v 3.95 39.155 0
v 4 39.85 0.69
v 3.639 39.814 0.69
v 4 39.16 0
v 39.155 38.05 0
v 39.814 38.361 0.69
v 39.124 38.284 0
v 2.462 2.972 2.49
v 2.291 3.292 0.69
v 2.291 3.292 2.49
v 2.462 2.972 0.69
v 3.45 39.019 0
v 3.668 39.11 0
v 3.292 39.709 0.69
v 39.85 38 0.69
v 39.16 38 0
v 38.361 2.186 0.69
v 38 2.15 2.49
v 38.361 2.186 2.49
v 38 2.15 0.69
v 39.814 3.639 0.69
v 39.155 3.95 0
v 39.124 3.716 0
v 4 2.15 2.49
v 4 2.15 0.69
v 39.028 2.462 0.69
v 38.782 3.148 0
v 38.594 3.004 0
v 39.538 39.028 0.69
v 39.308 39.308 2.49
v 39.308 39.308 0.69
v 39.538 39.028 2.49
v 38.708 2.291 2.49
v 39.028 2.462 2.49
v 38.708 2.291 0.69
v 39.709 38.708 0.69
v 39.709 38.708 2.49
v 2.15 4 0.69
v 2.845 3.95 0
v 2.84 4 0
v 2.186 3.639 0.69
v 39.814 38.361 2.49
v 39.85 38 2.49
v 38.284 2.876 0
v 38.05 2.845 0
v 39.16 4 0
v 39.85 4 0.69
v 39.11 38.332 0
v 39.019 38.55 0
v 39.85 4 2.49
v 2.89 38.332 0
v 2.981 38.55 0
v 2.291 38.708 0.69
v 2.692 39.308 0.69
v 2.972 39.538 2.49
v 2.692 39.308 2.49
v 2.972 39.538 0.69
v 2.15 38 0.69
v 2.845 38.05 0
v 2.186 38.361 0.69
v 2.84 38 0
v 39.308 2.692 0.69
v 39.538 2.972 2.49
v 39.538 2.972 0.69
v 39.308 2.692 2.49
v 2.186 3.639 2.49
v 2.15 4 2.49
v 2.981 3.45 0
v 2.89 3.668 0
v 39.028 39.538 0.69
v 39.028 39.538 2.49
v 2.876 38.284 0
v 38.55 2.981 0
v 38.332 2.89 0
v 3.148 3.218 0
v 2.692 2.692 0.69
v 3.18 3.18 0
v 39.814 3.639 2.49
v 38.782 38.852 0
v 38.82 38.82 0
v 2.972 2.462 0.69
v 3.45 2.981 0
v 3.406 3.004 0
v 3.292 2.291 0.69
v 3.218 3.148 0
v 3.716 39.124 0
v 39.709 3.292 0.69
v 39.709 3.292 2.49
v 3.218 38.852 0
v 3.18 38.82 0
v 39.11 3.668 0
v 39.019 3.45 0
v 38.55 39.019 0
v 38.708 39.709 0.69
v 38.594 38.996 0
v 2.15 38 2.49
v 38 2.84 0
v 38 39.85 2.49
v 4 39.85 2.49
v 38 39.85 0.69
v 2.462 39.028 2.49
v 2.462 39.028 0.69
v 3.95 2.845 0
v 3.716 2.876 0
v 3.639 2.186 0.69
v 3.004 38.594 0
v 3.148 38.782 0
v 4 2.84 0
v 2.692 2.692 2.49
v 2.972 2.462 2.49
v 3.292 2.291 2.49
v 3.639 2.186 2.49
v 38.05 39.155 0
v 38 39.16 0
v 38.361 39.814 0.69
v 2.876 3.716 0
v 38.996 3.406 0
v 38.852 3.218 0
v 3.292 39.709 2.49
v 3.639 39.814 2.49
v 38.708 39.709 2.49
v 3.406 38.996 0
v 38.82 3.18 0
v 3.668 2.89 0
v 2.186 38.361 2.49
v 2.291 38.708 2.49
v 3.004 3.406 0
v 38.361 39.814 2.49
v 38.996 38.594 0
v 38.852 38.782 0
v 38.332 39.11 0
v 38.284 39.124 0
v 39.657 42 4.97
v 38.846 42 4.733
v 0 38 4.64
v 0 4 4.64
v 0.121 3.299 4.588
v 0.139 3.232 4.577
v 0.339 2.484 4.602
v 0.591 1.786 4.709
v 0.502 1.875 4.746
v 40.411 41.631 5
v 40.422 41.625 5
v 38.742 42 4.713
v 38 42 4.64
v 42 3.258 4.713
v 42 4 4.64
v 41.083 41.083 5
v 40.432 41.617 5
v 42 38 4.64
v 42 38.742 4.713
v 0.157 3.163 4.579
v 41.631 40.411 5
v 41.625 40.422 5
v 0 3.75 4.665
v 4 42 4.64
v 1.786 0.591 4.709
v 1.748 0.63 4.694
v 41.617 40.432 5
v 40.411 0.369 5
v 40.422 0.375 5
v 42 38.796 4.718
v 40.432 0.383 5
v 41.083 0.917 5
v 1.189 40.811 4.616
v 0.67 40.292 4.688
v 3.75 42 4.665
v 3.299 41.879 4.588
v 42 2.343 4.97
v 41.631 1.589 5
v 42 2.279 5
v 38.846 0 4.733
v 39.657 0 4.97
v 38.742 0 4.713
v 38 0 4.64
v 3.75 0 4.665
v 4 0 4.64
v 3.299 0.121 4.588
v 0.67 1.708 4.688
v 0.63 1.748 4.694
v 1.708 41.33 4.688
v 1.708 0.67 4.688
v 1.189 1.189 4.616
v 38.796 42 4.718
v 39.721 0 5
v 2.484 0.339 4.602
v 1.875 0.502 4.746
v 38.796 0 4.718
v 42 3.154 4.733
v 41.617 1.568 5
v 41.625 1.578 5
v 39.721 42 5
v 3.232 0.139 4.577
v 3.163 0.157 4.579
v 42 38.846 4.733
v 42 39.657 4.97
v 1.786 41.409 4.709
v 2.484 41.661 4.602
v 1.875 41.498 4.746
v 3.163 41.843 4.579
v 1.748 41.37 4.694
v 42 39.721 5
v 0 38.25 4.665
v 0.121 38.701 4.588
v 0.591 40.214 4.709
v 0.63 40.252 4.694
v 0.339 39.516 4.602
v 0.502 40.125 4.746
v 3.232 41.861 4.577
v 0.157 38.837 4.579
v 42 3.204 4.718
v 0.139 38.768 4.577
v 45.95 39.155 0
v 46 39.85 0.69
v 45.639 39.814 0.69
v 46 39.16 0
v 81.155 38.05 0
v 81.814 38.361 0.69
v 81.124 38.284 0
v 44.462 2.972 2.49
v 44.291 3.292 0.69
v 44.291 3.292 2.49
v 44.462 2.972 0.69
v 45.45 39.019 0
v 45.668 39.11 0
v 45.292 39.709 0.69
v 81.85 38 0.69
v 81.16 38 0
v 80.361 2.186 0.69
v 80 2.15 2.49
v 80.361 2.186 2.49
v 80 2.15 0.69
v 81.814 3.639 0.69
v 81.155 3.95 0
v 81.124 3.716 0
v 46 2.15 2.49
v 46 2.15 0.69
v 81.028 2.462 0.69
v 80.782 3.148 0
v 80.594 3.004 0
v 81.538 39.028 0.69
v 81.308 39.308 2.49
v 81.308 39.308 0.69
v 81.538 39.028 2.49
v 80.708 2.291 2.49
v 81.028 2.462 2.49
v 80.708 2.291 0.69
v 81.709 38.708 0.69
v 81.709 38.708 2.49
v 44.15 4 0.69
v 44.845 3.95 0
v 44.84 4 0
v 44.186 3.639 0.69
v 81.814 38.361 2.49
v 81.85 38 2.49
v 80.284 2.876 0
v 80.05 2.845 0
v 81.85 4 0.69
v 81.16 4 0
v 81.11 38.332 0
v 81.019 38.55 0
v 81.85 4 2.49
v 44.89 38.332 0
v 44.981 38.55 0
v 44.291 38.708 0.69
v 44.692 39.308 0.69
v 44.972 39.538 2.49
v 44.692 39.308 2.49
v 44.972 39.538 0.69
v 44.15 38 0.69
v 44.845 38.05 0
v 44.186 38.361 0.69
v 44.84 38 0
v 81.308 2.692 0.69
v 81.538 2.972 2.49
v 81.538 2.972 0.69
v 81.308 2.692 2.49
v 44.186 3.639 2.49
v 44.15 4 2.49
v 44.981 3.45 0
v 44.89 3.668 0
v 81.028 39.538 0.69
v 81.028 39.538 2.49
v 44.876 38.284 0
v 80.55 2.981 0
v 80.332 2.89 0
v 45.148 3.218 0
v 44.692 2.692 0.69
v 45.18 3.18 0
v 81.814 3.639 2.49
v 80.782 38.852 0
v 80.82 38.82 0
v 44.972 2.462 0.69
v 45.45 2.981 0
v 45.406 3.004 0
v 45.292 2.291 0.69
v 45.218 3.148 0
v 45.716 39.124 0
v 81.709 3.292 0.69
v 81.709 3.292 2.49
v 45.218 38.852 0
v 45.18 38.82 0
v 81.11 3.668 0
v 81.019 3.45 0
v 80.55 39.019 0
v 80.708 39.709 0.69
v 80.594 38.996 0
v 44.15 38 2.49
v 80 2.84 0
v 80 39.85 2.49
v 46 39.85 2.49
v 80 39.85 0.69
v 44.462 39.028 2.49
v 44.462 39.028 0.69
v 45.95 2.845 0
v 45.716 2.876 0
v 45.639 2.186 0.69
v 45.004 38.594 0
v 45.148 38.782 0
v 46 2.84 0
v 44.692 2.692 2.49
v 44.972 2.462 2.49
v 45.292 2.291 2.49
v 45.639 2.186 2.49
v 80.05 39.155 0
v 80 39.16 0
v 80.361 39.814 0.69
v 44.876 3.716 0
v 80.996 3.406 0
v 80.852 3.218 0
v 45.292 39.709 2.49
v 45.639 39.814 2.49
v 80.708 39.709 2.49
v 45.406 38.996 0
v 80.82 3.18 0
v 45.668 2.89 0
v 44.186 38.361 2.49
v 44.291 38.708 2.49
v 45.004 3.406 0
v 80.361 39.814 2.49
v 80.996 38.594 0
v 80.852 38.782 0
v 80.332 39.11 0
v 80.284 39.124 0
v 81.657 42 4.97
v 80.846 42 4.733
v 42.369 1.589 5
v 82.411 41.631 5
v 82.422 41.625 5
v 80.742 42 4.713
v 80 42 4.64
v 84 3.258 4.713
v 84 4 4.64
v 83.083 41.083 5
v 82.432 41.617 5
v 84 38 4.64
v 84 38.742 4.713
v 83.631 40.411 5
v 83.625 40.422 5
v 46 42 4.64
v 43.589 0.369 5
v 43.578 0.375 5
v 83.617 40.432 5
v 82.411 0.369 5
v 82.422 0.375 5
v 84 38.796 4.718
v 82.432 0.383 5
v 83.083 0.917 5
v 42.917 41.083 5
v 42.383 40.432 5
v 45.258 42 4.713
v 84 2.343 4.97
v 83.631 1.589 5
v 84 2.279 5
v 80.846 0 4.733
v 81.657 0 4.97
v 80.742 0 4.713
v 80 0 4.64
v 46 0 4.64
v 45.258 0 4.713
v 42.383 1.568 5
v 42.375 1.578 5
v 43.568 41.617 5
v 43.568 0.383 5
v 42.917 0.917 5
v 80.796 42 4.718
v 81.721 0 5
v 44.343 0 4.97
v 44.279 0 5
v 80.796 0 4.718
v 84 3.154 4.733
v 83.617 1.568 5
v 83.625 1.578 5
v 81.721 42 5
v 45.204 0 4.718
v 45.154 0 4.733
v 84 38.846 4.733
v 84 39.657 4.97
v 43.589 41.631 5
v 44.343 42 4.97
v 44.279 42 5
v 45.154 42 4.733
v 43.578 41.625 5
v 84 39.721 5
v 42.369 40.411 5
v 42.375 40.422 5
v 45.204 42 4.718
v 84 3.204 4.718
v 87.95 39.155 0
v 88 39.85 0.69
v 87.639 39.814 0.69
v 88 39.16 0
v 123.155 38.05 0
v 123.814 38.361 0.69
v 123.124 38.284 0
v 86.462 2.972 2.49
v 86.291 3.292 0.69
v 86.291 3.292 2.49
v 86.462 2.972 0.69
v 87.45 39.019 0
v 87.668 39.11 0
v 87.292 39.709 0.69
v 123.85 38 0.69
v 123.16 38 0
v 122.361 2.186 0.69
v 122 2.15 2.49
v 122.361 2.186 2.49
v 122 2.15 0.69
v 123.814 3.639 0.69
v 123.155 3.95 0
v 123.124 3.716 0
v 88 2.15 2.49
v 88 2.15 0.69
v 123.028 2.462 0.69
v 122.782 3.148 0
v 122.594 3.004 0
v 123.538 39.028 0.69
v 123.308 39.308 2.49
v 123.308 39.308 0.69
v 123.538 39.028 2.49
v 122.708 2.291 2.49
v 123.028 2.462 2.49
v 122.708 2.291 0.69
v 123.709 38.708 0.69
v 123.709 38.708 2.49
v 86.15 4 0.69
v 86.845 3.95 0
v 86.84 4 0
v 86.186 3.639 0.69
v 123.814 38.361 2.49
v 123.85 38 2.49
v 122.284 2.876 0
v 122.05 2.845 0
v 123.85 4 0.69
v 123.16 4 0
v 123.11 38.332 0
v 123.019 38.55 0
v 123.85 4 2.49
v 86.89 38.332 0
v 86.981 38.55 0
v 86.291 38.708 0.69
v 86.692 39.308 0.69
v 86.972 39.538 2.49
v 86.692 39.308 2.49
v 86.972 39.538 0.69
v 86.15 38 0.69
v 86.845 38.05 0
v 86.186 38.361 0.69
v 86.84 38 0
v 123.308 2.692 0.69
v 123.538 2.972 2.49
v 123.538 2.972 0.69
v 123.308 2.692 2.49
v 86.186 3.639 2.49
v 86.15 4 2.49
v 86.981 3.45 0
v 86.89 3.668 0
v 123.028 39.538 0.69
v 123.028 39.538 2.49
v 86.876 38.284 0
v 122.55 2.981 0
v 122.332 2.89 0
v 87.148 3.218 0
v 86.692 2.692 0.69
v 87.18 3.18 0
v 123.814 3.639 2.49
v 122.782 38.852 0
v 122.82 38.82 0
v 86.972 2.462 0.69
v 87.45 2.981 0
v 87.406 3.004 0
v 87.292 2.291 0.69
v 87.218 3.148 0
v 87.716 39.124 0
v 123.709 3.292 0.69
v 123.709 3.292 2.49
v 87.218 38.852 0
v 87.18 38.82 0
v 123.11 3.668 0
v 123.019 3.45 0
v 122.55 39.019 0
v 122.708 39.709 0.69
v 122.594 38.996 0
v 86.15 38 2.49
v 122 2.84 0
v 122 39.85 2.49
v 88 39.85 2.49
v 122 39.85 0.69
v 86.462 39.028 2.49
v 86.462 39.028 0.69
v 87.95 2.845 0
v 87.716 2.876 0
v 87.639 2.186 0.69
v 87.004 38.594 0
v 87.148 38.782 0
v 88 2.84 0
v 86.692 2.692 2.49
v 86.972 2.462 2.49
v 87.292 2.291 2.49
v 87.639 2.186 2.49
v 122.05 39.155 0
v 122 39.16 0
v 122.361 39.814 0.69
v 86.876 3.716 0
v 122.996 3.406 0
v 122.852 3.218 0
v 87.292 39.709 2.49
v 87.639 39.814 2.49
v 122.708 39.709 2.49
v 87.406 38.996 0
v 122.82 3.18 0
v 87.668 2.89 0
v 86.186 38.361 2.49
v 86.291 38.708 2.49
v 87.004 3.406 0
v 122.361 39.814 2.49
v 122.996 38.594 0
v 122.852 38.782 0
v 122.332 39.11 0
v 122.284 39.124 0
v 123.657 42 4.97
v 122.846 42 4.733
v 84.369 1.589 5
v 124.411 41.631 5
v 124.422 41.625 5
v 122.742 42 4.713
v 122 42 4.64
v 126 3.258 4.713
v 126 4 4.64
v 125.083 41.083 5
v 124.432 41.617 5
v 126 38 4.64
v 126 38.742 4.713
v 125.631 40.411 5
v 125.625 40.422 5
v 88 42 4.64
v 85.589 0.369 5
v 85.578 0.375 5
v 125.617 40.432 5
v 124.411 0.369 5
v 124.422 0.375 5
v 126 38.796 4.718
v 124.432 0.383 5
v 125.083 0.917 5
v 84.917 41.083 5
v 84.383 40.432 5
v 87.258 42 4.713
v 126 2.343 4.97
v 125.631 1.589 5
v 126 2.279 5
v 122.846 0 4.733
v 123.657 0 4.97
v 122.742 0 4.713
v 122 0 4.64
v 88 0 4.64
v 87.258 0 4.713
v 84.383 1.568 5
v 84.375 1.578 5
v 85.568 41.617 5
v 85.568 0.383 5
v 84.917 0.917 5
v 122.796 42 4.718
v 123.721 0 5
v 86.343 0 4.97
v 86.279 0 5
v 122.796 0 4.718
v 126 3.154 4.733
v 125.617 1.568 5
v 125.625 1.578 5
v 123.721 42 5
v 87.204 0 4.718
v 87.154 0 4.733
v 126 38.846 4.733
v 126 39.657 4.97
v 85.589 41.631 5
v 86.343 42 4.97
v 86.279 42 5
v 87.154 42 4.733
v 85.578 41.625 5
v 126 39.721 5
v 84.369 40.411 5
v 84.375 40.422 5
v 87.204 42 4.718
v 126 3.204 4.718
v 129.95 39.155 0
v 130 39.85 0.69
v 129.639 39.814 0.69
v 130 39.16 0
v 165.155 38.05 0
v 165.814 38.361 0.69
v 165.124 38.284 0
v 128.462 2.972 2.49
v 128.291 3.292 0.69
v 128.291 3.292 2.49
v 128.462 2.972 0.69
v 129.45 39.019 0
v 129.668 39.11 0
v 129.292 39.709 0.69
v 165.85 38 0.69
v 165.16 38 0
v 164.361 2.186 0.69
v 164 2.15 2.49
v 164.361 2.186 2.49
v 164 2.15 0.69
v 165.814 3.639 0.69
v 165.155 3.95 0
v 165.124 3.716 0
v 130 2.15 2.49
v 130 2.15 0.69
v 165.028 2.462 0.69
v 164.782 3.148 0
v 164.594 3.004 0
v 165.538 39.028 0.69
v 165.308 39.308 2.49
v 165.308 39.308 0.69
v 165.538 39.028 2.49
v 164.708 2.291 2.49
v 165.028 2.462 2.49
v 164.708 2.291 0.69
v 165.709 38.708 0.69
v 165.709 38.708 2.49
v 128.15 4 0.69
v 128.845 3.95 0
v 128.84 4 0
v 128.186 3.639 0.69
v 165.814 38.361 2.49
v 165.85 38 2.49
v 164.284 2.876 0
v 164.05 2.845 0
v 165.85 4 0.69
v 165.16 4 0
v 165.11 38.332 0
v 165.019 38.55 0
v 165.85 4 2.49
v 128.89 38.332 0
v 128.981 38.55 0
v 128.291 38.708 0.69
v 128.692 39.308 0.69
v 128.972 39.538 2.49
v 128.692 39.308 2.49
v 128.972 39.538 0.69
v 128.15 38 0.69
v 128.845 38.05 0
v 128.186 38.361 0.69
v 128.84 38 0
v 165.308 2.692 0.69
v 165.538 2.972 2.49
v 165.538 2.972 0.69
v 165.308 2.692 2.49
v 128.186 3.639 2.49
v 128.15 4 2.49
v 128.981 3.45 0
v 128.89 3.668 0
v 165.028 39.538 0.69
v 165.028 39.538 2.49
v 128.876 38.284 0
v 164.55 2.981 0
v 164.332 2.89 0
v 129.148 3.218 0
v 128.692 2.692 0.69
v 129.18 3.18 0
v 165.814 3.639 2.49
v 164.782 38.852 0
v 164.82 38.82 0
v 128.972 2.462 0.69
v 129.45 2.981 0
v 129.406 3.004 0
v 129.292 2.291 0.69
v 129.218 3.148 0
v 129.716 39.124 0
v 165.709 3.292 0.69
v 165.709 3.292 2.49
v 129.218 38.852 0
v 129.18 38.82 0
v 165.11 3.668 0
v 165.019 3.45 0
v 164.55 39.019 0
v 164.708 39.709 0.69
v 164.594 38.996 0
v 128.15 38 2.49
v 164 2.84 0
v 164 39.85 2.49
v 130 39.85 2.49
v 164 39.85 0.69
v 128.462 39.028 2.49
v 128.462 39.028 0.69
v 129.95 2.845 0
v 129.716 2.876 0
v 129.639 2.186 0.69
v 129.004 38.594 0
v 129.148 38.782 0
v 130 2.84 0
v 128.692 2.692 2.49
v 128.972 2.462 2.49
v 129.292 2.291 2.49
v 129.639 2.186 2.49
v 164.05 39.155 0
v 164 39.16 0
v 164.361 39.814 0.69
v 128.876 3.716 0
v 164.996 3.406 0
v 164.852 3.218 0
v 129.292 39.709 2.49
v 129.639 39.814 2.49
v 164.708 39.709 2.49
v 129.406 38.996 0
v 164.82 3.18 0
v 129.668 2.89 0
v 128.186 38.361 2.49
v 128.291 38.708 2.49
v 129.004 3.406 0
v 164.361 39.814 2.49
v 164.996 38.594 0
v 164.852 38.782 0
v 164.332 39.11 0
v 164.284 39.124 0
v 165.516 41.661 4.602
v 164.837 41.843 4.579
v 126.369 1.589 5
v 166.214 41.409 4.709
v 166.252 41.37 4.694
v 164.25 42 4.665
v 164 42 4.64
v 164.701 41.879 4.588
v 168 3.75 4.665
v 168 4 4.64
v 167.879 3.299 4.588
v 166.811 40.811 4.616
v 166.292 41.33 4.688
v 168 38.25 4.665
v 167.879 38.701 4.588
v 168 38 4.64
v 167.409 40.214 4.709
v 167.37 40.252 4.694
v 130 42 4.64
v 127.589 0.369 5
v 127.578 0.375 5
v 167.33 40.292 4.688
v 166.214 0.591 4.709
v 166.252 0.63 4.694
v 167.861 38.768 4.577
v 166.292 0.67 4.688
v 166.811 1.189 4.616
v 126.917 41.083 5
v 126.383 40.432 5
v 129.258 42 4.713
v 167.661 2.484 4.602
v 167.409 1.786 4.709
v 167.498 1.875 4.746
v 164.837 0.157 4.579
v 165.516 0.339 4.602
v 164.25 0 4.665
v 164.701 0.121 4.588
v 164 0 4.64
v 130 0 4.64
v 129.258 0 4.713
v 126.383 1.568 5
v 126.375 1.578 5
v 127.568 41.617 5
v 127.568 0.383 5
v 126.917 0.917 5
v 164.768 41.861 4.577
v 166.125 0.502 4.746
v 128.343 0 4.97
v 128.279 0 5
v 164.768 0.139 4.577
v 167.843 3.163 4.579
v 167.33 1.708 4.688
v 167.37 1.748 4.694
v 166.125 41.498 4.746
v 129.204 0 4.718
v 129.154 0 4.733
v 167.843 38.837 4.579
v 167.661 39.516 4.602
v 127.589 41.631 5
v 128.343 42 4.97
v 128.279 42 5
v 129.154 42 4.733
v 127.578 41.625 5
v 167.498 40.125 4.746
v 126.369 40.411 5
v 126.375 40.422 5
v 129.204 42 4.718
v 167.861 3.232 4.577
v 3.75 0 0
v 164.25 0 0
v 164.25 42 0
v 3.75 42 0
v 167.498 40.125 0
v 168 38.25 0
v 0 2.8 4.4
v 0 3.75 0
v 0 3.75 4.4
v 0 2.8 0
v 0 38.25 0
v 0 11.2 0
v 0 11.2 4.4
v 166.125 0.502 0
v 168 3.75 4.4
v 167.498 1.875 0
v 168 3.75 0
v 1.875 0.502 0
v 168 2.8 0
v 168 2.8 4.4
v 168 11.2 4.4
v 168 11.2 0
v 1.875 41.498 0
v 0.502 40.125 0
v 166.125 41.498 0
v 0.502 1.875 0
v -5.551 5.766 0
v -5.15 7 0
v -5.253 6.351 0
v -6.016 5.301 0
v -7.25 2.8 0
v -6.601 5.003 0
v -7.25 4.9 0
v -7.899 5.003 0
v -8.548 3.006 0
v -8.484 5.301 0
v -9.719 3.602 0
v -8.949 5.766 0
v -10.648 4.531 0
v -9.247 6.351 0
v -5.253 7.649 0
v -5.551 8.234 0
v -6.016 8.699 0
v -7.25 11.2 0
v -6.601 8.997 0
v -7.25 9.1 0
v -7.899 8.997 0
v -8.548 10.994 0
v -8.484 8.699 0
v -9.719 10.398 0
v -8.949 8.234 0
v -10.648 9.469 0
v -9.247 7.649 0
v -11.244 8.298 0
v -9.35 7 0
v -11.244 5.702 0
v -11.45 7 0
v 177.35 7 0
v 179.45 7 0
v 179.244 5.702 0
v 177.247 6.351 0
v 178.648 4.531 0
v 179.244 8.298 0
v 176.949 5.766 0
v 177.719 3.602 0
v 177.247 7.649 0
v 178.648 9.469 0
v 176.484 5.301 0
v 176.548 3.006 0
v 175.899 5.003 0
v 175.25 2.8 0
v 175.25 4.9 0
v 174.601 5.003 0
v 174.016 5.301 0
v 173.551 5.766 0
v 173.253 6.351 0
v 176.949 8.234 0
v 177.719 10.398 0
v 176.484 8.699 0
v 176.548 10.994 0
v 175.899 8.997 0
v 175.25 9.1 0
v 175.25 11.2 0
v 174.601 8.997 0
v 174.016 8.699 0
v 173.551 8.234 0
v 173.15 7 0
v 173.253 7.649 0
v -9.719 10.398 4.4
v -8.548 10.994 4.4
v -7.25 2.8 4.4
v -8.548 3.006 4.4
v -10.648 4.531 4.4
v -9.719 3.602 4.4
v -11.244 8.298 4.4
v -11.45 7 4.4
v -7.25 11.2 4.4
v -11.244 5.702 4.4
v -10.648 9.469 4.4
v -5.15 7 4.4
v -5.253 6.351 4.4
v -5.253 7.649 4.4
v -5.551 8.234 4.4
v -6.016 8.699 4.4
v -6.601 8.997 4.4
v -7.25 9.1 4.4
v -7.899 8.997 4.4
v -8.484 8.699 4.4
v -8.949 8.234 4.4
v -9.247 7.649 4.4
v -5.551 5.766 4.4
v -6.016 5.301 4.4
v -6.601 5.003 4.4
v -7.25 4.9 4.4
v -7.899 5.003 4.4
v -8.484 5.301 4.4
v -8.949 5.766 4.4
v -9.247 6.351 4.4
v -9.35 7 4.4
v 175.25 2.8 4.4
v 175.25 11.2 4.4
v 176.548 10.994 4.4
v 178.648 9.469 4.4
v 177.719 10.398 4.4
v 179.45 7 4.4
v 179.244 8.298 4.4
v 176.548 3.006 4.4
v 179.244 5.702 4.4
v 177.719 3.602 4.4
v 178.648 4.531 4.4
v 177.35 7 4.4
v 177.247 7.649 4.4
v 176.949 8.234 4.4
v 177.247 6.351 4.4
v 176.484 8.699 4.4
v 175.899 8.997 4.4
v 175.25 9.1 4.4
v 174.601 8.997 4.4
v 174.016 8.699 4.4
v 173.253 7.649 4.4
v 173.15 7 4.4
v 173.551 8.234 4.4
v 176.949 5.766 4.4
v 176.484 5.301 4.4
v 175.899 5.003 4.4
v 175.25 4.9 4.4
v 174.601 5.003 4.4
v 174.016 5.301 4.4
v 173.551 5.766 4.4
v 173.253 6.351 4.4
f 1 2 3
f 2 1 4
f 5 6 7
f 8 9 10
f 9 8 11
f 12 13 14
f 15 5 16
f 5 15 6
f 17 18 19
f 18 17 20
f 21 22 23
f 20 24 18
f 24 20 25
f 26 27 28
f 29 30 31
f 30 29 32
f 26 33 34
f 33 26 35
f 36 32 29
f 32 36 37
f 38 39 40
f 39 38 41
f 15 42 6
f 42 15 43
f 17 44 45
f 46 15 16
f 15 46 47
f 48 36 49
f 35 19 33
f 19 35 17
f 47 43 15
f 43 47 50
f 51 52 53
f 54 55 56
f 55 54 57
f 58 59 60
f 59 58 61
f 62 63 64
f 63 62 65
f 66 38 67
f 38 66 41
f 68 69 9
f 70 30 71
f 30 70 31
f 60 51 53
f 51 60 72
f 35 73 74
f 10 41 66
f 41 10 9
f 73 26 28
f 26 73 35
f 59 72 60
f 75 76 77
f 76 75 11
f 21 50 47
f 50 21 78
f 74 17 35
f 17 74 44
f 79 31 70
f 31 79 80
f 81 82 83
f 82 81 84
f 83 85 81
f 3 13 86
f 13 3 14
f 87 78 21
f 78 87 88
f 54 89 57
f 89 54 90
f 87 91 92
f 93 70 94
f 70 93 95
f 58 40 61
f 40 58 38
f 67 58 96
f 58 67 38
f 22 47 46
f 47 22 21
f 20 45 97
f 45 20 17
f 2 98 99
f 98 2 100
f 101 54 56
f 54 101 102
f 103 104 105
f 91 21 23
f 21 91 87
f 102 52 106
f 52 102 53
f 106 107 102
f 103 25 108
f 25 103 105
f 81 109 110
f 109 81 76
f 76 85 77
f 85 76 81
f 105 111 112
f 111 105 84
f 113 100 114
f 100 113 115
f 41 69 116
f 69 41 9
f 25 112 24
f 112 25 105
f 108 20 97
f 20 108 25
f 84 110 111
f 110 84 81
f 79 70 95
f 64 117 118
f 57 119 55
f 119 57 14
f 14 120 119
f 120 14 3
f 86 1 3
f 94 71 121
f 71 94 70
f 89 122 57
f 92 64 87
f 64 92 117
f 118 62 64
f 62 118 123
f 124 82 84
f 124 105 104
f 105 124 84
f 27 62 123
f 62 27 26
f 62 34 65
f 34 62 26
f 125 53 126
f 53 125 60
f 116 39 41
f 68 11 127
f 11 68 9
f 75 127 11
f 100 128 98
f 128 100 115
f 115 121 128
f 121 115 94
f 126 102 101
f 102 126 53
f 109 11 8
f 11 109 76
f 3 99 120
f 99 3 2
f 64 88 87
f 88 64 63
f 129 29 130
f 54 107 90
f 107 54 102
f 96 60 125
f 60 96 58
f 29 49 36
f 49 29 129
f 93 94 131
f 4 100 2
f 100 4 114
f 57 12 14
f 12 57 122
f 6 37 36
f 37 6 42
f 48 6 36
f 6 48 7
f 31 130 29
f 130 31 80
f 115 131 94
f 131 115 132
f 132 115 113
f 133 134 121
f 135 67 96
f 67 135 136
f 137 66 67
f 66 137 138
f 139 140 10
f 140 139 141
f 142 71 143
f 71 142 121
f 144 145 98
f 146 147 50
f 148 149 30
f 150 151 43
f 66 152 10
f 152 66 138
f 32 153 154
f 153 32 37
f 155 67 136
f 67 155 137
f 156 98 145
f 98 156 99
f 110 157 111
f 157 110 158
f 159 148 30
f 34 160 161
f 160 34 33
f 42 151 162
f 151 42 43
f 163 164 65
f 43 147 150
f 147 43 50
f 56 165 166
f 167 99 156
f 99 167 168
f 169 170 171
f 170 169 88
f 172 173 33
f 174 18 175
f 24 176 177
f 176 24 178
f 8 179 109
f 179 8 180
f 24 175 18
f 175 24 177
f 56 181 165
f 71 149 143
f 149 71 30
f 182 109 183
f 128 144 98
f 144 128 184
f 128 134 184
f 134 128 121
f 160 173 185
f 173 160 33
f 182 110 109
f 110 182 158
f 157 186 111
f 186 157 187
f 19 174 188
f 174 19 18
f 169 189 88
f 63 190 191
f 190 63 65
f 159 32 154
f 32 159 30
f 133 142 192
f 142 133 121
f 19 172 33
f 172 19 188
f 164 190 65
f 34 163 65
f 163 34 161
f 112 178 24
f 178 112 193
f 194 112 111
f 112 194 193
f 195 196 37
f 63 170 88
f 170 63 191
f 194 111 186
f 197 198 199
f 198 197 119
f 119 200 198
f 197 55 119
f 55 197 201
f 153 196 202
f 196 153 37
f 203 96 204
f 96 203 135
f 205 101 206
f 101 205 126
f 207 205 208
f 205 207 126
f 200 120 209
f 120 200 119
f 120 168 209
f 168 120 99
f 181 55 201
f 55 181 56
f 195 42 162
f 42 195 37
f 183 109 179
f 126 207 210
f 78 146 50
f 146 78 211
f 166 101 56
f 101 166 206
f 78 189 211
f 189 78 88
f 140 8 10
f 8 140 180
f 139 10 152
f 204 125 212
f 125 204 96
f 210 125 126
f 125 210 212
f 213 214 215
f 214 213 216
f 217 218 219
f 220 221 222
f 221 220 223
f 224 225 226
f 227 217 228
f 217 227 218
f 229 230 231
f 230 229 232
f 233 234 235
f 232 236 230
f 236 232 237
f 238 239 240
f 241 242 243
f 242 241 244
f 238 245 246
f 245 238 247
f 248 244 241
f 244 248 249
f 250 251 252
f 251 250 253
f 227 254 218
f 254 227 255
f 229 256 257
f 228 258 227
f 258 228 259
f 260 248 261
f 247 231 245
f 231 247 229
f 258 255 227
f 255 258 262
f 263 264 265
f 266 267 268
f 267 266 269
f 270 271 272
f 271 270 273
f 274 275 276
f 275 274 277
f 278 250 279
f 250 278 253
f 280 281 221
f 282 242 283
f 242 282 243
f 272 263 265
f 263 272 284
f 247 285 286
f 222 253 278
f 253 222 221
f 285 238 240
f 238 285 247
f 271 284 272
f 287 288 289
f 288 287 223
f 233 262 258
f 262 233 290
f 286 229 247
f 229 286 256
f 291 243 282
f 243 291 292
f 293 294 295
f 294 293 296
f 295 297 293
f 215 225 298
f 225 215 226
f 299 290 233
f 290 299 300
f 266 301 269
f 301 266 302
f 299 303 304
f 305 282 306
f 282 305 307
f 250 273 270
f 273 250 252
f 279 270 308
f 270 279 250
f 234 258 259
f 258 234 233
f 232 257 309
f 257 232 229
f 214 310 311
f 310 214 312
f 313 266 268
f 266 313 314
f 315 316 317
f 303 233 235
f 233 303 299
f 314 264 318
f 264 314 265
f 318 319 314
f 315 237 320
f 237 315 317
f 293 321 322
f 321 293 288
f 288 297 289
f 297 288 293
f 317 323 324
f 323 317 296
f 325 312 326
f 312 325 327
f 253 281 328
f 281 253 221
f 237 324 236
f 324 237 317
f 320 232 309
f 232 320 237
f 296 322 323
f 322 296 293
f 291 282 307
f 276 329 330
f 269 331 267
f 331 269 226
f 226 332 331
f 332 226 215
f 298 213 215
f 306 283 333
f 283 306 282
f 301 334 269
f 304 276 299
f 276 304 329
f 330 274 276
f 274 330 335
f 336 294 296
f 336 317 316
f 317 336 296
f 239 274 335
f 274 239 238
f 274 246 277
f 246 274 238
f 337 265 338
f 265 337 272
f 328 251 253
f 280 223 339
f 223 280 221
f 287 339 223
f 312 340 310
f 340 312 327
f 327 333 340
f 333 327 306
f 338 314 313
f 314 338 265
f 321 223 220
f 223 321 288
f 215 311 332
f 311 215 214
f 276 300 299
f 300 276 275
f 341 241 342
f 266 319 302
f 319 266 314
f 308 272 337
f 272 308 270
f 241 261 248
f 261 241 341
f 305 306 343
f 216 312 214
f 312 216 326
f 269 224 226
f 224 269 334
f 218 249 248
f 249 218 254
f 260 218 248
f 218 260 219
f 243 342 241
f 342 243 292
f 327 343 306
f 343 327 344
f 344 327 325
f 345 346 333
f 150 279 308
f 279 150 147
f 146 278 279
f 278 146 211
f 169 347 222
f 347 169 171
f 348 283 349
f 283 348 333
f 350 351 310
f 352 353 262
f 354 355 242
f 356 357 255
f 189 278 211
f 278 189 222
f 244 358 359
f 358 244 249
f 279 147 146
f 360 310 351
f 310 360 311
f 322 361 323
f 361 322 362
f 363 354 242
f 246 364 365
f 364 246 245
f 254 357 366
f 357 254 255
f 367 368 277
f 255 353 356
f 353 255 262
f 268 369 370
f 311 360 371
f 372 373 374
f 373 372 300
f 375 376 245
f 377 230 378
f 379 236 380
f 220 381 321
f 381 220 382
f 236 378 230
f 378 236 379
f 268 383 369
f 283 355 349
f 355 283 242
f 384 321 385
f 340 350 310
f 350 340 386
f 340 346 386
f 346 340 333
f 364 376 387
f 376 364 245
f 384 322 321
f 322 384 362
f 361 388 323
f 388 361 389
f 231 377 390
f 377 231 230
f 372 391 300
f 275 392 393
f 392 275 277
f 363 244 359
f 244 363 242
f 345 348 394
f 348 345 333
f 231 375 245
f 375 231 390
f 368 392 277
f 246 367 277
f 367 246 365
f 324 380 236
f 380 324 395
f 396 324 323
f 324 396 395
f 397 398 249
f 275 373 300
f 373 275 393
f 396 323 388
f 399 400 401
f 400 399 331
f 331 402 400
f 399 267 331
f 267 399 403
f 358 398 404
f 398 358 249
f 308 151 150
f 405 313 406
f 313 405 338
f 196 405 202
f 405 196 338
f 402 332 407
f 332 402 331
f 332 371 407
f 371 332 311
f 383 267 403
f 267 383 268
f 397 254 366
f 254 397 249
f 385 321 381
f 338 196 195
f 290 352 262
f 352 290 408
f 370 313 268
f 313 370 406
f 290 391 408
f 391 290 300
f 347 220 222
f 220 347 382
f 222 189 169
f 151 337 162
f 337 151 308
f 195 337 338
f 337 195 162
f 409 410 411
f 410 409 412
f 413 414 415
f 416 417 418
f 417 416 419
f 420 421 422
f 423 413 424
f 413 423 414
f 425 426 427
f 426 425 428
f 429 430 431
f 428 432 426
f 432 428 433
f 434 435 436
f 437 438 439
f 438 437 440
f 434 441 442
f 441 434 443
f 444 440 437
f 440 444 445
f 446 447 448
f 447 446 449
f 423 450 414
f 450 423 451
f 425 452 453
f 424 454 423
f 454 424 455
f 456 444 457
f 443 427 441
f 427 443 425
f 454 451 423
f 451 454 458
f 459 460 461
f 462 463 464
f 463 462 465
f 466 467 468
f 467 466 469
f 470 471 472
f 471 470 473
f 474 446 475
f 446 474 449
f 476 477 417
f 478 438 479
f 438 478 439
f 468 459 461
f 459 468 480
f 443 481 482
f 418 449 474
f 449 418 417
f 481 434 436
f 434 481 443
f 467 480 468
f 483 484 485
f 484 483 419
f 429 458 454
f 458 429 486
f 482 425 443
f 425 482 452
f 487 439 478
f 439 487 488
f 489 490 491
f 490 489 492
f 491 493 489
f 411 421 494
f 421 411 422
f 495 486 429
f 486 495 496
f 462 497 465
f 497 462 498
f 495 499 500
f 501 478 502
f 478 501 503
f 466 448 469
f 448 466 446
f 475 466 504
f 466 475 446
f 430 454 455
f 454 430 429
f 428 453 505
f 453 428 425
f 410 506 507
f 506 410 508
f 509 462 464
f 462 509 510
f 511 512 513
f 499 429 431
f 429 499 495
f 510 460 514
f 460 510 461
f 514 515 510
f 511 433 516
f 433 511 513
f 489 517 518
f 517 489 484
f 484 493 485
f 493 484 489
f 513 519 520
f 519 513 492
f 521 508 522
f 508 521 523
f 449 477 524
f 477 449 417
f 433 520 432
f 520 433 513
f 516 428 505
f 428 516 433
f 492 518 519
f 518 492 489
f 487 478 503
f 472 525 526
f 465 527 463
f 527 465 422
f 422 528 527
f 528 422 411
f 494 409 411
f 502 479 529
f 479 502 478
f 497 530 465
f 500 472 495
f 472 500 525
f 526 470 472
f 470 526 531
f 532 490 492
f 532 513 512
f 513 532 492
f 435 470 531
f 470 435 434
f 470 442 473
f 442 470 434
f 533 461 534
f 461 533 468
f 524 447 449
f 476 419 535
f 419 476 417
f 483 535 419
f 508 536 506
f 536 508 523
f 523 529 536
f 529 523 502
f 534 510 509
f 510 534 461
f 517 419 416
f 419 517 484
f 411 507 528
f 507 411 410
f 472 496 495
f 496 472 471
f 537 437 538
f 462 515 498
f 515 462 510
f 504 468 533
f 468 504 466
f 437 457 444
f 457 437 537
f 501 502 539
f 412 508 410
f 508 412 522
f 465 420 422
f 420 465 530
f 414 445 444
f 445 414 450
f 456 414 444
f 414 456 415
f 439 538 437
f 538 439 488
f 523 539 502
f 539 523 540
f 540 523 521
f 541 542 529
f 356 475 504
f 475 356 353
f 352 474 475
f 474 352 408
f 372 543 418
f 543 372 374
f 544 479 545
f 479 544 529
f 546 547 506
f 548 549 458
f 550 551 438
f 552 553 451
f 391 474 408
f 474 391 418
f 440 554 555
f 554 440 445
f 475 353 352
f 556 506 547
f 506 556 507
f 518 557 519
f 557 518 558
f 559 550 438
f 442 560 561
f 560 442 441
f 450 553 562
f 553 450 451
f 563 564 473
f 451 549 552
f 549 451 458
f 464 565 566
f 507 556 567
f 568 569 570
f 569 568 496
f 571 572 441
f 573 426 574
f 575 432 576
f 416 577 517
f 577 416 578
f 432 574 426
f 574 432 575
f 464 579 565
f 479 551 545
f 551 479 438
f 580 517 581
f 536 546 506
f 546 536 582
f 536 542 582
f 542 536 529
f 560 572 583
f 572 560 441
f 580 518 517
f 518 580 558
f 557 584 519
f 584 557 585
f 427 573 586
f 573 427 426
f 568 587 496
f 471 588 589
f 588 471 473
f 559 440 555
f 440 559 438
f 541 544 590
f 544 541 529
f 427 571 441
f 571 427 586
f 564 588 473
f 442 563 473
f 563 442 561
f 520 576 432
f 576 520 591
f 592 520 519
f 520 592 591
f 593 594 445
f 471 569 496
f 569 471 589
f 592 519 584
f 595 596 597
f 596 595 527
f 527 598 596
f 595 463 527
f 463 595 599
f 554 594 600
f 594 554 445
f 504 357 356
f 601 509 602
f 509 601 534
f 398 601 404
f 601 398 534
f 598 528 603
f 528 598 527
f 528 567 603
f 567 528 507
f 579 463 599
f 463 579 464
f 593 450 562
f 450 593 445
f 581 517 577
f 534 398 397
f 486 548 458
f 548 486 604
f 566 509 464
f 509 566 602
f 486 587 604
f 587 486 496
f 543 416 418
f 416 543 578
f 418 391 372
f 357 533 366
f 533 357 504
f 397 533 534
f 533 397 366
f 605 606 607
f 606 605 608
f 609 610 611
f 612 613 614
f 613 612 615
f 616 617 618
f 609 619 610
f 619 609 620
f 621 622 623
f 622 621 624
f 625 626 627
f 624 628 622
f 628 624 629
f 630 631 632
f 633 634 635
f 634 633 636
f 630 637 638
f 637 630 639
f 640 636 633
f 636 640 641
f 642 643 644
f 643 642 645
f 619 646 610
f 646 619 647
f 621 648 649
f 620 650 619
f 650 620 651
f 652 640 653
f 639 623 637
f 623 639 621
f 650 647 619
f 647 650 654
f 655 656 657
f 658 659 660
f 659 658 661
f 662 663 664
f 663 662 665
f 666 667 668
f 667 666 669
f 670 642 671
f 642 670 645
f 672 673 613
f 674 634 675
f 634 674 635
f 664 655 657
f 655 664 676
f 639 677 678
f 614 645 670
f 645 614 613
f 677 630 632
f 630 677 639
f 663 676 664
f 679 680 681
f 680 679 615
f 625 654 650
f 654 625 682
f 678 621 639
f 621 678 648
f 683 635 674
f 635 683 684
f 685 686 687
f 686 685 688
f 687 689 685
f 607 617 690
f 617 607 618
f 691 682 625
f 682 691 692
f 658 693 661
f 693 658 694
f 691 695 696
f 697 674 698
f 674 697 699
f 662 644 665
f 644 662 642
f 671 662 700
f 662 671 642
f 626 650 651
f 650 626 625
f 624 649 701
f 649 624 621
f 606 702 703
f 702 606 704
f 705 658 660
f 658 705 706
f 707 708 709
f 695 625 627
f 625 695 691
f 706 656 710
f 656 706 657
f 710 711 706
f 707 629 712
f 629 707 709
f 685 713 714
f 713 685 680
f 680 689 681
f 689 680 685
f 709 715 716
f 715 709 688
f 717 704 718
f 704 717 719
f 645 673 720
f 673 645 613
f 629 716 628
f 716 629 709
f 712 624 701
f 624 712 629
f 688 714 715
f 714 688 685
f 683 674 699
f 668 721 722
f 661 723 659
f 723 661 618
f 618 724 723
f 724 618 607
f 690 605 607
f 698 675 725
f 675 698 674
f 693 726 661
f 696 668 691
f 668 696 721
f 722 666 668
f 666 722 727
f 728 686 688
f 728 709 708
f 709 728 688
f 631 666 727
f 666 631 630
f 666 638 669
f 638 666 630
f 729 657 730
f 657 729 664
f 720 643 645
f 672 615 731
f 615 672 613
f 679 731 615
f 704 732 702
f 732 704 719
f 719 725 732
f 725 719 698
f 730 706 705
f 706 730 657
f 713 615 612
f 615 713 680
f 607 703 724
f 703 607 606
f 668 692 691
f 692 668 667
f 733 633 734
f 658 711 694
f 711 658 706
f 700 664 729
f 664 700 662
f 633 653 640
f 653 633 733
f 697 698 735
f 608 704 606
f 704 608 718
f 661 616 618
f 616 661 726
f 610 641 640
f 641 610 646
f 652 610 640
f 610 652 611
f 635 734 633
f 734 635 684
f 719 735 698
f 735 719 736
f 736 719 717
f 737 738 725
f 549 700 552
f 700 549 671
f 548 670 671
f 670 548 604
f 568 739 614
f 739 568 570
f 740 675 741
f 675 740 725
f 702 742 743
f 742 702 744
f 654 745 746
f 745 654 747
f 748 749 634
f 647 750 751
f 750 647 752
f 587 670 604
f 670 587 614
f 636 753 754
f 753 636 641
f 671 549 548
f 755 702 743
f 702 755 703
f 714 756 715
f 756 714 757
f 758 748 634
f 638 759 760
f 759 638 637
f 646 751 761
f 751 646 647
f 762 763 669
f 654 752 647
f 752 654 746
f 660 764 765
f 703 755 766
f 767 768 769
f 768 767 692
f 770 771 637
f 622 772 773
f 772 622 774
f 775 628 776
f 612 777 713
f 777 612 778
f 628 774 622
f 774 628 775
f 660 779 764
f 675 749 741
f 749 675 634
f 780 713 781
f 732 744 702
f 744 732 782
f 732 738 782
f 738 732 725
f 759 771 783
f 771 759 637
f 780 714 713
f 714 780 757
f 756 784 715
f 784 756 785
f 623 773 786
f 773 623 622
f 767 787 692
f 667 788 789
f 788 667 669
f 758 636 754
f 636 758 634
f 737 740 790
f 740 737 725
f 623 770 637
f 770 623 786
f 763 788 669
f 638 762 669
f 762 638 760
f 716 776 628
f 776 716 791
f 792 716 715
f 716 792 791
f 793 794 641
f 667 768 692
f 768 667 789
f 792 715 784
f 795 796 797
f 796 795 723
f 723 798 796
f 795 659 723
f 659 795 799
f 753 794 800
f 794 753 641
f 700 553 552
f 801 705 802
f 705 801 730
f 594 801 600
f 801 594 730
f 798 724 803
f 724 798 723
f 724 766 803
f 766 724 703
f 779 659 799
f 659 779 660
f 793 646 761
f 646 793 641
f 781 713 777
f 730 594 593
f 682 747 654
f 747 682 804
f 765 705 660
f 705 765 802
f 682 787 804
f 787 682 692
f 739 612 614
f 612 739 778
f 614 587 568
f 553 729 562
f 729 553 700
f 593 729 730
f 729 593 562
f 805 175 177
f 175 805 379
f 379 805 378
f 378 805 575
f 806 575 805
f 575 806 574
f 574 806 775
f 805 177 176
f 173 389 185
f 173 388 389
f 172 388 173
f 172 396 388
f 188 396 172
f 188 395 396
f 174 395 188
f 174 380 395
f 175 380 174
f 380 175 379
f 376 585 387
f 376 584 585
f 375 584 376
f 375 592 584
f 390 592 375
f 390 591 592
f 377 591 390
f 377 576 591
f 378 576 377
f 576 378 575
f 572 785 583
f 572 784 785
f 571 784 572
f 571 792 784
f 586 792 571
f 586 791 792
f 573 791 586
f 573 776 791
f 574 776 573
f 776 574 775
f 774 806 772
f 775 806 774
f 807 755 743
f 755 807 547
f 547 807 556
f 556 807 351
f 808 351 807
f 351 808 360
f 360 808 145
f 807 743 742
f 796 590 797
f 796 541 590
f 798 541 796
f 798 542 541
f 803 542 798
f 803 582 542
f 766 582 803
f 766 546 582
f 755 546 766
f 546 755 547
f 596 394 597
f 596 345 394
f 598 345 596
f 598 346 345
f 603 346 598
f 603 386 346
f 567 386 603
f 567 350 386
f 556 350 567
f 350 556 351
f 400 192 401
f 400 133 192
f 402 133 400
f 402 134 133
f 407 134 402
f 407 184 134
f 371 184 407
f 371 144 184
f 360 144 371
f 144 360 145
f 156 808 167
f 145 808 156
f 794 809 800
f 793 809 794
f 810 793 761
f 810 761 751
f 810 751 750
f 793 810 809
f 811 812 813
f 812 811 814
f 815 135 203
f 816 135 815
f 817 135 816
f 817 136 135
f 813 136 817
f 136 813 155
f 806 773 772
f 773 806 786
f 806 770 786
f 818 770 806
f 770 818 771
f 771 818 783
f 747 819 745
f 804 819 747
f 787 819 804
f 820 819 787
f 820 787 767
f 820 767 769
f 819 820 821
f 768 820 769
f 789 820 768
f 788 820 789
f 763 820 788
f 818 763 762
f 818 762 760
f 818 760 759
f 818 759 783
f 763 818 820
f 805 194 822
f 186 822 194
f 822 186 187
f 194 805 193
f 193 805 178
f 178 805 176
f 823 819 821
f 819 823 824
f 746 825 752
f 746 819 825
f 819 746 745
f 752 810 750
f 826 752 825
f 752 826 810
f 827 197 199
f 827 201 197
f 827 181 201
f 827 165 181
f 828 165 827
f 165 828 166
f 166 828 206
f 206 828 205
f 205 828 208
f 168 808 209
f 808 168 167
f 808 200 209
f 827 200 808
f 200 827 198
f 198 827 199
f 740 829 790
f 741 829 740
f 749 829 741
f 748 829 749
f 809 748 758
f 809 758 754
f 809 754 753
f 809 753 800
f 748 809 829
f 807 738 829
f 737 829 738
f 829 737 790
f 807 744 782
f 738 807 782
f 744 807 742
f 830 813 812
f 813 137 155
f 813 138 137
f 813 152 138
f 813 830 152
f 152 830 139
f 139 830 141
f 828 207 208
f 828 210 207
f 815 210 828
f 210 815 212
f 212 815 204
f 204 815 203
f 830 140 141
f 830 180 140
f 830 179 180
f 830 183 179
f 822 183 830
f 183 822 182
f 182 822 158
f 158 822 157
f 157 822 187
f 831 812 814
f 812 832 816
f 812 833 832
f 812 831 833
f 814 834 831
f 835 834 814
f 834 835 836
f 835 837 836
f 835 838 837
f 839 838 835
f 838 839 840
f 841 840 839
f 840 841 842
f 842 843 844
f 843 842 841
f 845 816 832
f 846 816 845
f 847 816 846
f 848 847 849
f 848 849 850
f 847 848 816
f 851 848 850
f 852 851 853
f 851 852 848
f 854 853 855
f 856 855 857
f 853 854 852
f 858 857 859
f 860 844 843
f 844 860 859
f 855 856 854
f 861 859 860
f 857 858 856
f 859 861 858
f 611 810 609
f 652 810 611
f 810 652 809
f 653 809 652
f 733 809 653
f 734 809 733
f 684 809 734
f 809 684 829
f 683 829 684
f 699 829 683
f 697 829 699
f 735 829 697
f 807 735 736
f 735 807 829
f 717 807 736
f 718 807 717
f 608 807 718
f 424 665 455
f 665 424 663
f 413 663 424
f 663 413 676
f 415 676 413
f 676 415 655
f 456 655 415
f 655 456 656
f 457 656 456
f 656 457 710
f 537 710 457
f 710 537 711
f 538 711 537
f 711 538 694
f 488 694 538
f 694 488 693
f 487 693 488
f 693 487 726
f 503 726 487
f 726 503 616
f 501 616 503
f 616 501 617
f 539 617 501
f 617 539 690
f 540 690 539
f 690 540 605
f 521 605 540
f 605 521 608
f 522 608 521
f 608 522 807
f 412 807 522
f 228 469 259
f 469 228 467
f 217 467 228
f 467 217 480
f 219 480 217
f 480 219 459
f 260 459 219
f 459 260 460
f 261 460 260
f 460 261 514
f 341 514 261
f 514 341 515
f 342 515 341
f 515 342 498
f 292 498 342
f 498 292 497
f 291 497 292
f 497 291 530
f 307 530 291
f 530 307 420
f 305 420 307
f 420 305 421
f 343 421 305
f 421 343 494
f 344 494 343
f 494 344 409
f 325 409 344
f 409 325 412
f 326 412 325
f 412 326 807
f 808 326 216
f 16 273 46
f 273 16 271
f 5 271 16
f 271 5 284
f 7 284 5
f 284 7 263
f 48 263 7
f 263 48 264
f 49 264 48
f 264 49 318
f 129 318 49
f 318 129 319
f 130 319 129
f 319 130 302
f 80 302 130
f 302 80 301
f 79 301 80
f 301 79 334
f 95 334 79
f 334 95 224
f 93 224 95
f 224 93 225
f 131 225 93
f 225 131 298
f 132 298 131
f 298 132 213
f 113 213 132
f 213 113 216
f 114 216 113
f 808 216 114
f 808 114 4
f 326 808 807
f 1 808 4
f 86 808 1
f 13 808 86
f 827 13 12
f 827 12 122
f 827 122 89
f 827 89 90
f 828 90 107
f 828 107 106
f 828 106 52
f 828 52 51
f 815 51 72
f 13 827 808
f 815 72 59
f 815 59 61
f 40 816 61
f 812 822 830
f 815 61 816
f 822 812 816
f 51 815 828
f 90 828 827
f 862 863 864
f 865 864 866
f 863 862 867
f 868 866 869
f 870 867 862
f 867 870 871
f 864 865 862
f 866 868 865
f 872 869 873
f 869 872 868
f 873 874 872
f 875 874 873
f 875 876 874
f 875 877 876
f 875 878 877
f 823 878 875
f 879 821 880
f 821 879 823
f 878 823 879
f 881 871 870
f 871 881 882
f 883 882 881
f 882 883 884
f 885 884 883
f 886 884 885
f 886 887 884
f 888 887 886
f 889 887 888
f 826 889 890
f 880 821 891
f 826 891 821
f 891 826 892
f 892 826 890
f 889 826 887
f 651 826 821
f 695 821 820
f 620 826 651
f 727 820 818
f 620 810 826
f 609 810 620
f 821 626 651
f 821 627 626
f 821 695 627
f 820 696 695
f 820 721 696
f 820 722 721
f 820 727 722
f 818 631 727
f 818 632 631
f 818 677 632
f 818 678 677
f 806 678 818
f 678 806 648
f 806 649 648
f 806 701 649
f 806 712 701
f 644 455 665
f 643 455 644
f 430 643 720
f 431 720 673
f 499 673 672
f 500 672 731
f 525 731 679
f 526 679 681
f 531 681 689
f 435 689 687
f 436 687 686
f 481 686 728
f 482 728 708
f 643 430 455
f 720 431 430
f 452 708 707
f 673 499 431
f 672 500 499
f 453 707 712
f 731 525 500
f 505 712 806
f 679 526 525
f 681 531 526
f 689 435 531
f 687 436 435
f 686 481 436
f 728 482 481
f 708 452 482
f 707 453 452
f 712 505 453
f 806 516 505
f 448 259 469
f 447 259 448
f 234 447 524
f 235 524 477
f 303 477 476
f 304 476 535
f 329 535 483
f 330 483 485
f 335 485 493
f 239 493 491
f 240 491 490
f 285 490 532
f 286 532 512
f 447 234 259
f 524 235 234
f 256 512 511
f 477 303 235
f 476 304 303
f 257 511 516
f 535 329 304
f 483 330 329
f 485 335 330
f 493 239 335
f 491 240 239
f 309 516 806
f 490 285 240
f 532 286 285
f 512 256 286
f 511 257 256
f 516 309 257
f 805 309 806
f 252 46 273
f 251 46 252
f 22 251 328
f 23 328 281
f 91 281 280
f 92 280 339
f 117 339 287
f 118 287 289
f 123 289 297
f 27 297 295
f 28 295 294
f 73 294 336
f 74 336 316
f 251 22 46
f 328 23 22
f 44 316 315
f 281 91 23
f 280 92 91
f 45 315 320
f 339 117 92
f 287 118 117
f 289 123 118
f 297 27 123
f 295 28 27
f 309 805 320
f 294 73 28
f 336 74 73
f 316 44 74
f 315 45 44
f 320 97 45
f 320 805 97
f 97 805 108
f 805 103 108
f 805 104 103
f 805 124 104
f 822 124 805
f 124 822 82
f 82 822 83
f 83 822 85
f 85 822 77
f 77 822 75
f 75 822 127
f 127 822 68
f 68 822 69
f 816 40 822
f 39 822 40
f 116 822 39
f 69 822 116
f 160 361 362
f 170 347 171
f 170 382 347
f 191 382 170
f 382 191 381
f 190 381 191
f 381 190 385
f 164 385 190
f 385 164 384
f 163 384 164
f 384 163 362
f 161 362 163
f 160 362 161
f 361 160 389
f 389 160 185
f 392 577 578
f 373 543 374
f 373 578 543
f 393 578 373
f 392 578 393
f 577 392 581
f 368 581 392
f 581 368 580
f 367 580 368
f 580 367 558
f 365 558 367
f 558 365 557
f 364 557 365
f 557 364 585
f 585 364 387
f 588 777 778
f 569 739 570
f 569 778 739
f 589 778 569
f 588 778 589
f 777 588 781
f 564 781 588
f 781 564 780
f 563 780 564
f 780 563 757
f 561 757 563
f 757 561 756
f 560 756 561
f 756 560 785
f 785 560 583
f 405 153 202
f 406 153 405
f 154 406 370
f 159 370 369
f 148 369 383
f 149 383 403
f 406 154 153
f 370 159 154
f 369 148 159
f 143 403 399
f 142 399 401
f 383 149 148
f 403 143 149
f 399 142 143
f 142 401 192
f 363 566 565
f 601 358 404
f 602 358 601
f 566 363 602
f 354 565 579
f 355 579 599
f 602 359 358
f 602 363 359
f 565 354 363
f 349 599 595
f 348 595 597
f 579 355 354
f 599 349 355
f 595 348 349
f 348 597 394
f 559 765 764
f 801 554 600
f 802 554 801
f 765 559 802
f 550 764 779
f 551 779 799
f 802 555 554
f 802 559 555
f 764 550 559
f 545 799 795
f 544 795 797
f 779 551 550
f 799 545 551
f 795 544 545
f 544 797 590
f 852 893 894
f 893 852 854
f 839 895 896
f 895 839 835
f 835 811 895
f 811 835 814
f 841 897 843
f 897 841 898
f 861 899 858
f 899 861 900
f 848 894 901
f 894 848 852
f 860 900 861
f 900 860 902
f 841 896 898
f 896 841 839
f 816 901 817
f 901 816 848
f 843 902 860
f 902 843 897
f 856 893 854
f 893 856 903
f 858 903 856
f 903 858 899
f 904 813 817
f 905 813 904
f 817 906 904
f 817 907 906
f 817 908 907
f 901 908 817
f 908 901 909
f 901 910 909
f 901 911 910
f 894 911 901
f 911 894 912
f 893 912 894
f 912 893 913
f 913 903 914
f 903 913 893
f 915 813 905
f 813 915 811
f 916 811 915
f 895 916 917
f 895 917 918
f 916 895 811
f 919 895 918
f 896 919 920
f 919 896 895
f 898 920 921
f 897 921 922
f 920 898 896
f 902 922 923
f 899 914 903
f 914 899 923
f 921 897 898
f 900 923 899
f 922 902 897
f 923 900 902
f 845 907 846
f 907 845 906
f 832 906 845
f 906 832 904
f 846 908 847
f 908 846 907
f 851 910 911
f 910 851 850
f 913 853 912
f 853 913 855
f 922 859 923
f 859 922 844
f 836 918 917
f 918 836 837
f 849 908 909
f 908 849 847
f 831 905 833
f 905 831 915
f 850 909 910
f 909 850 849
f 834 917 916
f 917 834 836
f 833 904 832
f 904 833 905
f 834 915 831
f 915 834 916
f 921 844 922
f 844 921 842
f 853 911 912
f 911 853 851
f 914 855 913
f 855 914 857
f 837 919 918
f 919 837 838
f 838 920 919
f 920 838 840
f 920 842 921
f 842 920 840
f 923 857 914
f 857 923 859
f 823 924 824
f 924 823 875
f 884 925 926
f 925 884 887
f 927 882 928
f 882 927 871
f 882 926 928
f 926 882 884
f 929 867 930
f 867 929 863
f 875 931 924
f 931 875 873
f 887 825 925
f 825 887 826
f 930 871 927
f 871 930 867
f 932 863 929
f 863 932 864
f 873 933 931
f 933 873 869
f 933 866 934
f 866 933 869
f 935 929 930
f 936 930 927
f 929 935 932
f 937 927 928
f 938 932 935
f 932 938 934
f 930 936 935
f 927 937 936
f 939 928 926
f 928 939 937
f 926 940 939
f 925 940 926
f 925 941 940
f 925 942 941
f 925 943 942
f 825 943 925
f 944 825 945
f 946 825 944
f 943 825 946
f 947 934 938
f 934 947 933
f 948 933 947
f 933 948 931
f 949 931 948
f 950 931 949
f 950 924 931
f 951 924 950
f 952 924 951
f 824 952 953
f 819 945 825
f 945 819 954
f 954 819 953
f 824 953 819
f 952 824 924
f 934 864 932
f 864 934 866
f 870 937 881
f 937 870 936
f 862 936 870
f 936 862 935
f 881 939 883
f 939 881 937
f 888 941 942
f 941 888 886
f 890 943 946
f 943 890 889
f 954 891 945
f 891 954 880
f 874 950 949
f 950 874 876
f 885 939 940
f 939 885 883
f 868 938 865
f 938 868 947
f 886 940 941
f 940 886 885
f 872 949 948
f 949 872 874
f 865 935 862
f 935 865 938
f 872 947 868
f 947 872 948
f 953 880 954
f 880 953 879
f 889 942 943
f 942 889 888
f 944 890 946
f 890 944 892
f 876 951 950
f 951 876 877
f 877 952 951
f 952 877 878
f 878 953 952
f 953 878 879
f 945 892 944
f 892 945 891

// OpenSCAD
// file: gridfinity_modules.scad
gridfinity_pitch = 42;
gridfinity_zpitch = 7;
gridfinity_clearance = 0.5;  // each bin is undersize by this much


// basic block with cutout in top to be stackable, optional holes in bottom
// start with this and begin 'carving'
module grid_block(num_x=1, num_y=1, num_z=2, bot_hole_depth=6, center=false) {
  corner_radius = 3.75;
  outer_size = gridfinity_pitch - gridfinity_clearance;  // typically 41.5
  block_corner_position = outer_size/2 - corner_radius;  // need not match center of pad corners
  
  totalht=gridfinity_zpitch*num_z+3.75;
  translate( center ? [-(num_x-1)*gridfinity_pitch/2, -(num_y-1)*gridfinity_pitch/2, 0] : [0, 0, 0] )
  difference() {
    intersection() {
      union() {
        // grid of pads
        gridcopy(num_x, num_y) pad_oversize();
        // main body will be cut down afterward
        translate([-gridfinity_pitch/2, -gridfinity_pitch/2, 5]) 
          cube([gridfinity_pitch*num_x, gridfinity_pitch*num_y, totalht-5]);
      }
      
      // crop with outer cylinders
      translate([0, 0, -0.1])
      hull() cornercopy(block_corner_position, num_x, num_y) 
        cylinder(r=corner_radius, h=totalht+0.2, $fn=44);
    }
    
    // remove top so XxY can fit on top
    translate([0, 0, gridfinity_zpitch*num_z]) pad_oversize(num_x, num_y, 1);
    
    // add holes in bottom pads if requested
    if (bot_hole_depth > 0) {
      gridcopy(num_x, num_y) bottomholes(bot_hole_depth);
    }
  }
}


// holes in the bottom of the pads (slightly short to allow deeper
module bottomholes(depth=6) {
  magnet_position = 13;
  magnet_od = 6.5;
  magnet_thickness = 2.4;
  eps = 0.1;  // differences are annoying with coincident faces
  if (depth > 0) {
    cornercopy(magnet_position) {
      translate([0, 0, -eps]) cylinder(d=magnet_od, h=magnet_thickness+eps, $fn=41);
      cylinder(d=3, h=depth, $fn=28);
    }
  }
}


// unit pad slightly oversize at the top to be trimmed or joined with other feet or the rest of the model
// also useful as cutouts for stacking
module pad_oversize(num_x=1, num_y=1, margins=0) {
  pad_corner_position = 17; // must be 17 to be compatible
  bevel1_top = 0.8;     // z of top of bottom-most bevel (bottom of bevel is at z=0)
  bevel2_bottom = 2.6;  // z of bottom of second bevel
  bevel2_top = 5;       // z of top of second bevel
  bonus_ht = 0.2;       // extra height (and radius) on second bevel
  
  // female parts are a bit oversize for a nicer fit
  radialgap = margins ? 0.25 : 0;  // oversize cylinders for a bit of clearance
  axialdown = margins ? 0.1 : 0;   // a tiny bit of axial clearance present in Zack's design
  
  translate([0, 0, -axialdown])
  difference() {
    union() {
      hull() cornercopy(pad_corner_position, num_x, num_y) {
        cylinder(d=1.6+2*radialgap, h=0.1, $fn=24);
        translate([0, 0, bevel1_top]) cylinder(d=3.2+2*radialgap, h=1.9, $fn=32);
      }
      
      hull() cornercopy(pad_corner_position, num_x, num_y) {
        translate([0, 0, bevel2_bottom]) 
        cylinder(d1=3.2+2*radialgap, d2=7.5+0.5+2*radialgap+2*bonus_ht, h=bevel2_top-bevel2_bottom+bonus_ht, $fn=32);
      }
    }
    
    // cut off bottom if we're going to go negative
    if (margins) {
      translate([-gridfinity_pitch/2, -gridfinity_pitch/2, 0])
      cube([gridfinity_pitch, gridfinity_pitch, axialdown]);
    }
  }
}


// similar to quadtranslate but expands to extremities of a block
module cornercopy(r, num_x=1, num_y=1) {
  for (xx=[-r, gridfinity_pitch*(num_x-1)+r]) for (yy=[-r, gridfinity_pitch*(num_y-1)+r]) 
    translate([xx, yy, 0]) children();
}


// make repeated copies of something(s) at the gridfinity spacing of 42mm
module gridcopy(num_x, num_y) {
  for (xi=[1:num_x]) for (yi=[1:num_y]) translate([gridfinity_pitch*(xi-1), gridfinity_pitch*(yi-1), 0]) children();
}
// main file
// include instead of use, so we get the pitch
include <gridfinity_modules.scad>

module frame_plain(num_x, num_y, extra_down=0) {
  ht = extra_down > 0 ? 4.4 : 5;
  corner_radius = 3.75;
  corner_position = gridfinity_pitch/2-corner_radius;
  difference() {
    hull() cornercopy(corner_position, num_x, num_y) 
    translate([0, 0, -extra_down]) cylinder(r=corner_radius, h=ht+extra_down);
    translate([0, 0, -0.01]) render() gridcopy(num_x, num_y) pad_oversize(margins=1);
  }
}

translate([gridfinity_pitch/2, gridfinity_pitch/2, 0]) frame_plain(4, 1);
ear_hole_x = 182.5; // distance between existing screw holes on FLSUN q5.
ear_hole_y = 7; // distance of screw hole from the front panel.
from_ends = (ear_hole_x - gridfinity_pitch*4) / 2;
cube_z = 4.4; // ht from above.
M4_d = 4.2; // diameter needed for an M4 bolt.

for (i = [0,1]) {
    x = i * ear_hole_x - from_ends;
    difference() {
        hull() {
            translate([x, ear_hole_y, 0]) cylinder(h=cube_z, d=M4_d*2, $fn=20);
            translate([x - from_ends * i, ear_hole_y - M4_d, 0]) cube([from_ends, M4_d*2, cube_z]);
            }
        translate([x, ear_hole_y, -0.01]) cylinder(h=cube_z + 0.02, d=M4_d, $fn=20);
    }
}
